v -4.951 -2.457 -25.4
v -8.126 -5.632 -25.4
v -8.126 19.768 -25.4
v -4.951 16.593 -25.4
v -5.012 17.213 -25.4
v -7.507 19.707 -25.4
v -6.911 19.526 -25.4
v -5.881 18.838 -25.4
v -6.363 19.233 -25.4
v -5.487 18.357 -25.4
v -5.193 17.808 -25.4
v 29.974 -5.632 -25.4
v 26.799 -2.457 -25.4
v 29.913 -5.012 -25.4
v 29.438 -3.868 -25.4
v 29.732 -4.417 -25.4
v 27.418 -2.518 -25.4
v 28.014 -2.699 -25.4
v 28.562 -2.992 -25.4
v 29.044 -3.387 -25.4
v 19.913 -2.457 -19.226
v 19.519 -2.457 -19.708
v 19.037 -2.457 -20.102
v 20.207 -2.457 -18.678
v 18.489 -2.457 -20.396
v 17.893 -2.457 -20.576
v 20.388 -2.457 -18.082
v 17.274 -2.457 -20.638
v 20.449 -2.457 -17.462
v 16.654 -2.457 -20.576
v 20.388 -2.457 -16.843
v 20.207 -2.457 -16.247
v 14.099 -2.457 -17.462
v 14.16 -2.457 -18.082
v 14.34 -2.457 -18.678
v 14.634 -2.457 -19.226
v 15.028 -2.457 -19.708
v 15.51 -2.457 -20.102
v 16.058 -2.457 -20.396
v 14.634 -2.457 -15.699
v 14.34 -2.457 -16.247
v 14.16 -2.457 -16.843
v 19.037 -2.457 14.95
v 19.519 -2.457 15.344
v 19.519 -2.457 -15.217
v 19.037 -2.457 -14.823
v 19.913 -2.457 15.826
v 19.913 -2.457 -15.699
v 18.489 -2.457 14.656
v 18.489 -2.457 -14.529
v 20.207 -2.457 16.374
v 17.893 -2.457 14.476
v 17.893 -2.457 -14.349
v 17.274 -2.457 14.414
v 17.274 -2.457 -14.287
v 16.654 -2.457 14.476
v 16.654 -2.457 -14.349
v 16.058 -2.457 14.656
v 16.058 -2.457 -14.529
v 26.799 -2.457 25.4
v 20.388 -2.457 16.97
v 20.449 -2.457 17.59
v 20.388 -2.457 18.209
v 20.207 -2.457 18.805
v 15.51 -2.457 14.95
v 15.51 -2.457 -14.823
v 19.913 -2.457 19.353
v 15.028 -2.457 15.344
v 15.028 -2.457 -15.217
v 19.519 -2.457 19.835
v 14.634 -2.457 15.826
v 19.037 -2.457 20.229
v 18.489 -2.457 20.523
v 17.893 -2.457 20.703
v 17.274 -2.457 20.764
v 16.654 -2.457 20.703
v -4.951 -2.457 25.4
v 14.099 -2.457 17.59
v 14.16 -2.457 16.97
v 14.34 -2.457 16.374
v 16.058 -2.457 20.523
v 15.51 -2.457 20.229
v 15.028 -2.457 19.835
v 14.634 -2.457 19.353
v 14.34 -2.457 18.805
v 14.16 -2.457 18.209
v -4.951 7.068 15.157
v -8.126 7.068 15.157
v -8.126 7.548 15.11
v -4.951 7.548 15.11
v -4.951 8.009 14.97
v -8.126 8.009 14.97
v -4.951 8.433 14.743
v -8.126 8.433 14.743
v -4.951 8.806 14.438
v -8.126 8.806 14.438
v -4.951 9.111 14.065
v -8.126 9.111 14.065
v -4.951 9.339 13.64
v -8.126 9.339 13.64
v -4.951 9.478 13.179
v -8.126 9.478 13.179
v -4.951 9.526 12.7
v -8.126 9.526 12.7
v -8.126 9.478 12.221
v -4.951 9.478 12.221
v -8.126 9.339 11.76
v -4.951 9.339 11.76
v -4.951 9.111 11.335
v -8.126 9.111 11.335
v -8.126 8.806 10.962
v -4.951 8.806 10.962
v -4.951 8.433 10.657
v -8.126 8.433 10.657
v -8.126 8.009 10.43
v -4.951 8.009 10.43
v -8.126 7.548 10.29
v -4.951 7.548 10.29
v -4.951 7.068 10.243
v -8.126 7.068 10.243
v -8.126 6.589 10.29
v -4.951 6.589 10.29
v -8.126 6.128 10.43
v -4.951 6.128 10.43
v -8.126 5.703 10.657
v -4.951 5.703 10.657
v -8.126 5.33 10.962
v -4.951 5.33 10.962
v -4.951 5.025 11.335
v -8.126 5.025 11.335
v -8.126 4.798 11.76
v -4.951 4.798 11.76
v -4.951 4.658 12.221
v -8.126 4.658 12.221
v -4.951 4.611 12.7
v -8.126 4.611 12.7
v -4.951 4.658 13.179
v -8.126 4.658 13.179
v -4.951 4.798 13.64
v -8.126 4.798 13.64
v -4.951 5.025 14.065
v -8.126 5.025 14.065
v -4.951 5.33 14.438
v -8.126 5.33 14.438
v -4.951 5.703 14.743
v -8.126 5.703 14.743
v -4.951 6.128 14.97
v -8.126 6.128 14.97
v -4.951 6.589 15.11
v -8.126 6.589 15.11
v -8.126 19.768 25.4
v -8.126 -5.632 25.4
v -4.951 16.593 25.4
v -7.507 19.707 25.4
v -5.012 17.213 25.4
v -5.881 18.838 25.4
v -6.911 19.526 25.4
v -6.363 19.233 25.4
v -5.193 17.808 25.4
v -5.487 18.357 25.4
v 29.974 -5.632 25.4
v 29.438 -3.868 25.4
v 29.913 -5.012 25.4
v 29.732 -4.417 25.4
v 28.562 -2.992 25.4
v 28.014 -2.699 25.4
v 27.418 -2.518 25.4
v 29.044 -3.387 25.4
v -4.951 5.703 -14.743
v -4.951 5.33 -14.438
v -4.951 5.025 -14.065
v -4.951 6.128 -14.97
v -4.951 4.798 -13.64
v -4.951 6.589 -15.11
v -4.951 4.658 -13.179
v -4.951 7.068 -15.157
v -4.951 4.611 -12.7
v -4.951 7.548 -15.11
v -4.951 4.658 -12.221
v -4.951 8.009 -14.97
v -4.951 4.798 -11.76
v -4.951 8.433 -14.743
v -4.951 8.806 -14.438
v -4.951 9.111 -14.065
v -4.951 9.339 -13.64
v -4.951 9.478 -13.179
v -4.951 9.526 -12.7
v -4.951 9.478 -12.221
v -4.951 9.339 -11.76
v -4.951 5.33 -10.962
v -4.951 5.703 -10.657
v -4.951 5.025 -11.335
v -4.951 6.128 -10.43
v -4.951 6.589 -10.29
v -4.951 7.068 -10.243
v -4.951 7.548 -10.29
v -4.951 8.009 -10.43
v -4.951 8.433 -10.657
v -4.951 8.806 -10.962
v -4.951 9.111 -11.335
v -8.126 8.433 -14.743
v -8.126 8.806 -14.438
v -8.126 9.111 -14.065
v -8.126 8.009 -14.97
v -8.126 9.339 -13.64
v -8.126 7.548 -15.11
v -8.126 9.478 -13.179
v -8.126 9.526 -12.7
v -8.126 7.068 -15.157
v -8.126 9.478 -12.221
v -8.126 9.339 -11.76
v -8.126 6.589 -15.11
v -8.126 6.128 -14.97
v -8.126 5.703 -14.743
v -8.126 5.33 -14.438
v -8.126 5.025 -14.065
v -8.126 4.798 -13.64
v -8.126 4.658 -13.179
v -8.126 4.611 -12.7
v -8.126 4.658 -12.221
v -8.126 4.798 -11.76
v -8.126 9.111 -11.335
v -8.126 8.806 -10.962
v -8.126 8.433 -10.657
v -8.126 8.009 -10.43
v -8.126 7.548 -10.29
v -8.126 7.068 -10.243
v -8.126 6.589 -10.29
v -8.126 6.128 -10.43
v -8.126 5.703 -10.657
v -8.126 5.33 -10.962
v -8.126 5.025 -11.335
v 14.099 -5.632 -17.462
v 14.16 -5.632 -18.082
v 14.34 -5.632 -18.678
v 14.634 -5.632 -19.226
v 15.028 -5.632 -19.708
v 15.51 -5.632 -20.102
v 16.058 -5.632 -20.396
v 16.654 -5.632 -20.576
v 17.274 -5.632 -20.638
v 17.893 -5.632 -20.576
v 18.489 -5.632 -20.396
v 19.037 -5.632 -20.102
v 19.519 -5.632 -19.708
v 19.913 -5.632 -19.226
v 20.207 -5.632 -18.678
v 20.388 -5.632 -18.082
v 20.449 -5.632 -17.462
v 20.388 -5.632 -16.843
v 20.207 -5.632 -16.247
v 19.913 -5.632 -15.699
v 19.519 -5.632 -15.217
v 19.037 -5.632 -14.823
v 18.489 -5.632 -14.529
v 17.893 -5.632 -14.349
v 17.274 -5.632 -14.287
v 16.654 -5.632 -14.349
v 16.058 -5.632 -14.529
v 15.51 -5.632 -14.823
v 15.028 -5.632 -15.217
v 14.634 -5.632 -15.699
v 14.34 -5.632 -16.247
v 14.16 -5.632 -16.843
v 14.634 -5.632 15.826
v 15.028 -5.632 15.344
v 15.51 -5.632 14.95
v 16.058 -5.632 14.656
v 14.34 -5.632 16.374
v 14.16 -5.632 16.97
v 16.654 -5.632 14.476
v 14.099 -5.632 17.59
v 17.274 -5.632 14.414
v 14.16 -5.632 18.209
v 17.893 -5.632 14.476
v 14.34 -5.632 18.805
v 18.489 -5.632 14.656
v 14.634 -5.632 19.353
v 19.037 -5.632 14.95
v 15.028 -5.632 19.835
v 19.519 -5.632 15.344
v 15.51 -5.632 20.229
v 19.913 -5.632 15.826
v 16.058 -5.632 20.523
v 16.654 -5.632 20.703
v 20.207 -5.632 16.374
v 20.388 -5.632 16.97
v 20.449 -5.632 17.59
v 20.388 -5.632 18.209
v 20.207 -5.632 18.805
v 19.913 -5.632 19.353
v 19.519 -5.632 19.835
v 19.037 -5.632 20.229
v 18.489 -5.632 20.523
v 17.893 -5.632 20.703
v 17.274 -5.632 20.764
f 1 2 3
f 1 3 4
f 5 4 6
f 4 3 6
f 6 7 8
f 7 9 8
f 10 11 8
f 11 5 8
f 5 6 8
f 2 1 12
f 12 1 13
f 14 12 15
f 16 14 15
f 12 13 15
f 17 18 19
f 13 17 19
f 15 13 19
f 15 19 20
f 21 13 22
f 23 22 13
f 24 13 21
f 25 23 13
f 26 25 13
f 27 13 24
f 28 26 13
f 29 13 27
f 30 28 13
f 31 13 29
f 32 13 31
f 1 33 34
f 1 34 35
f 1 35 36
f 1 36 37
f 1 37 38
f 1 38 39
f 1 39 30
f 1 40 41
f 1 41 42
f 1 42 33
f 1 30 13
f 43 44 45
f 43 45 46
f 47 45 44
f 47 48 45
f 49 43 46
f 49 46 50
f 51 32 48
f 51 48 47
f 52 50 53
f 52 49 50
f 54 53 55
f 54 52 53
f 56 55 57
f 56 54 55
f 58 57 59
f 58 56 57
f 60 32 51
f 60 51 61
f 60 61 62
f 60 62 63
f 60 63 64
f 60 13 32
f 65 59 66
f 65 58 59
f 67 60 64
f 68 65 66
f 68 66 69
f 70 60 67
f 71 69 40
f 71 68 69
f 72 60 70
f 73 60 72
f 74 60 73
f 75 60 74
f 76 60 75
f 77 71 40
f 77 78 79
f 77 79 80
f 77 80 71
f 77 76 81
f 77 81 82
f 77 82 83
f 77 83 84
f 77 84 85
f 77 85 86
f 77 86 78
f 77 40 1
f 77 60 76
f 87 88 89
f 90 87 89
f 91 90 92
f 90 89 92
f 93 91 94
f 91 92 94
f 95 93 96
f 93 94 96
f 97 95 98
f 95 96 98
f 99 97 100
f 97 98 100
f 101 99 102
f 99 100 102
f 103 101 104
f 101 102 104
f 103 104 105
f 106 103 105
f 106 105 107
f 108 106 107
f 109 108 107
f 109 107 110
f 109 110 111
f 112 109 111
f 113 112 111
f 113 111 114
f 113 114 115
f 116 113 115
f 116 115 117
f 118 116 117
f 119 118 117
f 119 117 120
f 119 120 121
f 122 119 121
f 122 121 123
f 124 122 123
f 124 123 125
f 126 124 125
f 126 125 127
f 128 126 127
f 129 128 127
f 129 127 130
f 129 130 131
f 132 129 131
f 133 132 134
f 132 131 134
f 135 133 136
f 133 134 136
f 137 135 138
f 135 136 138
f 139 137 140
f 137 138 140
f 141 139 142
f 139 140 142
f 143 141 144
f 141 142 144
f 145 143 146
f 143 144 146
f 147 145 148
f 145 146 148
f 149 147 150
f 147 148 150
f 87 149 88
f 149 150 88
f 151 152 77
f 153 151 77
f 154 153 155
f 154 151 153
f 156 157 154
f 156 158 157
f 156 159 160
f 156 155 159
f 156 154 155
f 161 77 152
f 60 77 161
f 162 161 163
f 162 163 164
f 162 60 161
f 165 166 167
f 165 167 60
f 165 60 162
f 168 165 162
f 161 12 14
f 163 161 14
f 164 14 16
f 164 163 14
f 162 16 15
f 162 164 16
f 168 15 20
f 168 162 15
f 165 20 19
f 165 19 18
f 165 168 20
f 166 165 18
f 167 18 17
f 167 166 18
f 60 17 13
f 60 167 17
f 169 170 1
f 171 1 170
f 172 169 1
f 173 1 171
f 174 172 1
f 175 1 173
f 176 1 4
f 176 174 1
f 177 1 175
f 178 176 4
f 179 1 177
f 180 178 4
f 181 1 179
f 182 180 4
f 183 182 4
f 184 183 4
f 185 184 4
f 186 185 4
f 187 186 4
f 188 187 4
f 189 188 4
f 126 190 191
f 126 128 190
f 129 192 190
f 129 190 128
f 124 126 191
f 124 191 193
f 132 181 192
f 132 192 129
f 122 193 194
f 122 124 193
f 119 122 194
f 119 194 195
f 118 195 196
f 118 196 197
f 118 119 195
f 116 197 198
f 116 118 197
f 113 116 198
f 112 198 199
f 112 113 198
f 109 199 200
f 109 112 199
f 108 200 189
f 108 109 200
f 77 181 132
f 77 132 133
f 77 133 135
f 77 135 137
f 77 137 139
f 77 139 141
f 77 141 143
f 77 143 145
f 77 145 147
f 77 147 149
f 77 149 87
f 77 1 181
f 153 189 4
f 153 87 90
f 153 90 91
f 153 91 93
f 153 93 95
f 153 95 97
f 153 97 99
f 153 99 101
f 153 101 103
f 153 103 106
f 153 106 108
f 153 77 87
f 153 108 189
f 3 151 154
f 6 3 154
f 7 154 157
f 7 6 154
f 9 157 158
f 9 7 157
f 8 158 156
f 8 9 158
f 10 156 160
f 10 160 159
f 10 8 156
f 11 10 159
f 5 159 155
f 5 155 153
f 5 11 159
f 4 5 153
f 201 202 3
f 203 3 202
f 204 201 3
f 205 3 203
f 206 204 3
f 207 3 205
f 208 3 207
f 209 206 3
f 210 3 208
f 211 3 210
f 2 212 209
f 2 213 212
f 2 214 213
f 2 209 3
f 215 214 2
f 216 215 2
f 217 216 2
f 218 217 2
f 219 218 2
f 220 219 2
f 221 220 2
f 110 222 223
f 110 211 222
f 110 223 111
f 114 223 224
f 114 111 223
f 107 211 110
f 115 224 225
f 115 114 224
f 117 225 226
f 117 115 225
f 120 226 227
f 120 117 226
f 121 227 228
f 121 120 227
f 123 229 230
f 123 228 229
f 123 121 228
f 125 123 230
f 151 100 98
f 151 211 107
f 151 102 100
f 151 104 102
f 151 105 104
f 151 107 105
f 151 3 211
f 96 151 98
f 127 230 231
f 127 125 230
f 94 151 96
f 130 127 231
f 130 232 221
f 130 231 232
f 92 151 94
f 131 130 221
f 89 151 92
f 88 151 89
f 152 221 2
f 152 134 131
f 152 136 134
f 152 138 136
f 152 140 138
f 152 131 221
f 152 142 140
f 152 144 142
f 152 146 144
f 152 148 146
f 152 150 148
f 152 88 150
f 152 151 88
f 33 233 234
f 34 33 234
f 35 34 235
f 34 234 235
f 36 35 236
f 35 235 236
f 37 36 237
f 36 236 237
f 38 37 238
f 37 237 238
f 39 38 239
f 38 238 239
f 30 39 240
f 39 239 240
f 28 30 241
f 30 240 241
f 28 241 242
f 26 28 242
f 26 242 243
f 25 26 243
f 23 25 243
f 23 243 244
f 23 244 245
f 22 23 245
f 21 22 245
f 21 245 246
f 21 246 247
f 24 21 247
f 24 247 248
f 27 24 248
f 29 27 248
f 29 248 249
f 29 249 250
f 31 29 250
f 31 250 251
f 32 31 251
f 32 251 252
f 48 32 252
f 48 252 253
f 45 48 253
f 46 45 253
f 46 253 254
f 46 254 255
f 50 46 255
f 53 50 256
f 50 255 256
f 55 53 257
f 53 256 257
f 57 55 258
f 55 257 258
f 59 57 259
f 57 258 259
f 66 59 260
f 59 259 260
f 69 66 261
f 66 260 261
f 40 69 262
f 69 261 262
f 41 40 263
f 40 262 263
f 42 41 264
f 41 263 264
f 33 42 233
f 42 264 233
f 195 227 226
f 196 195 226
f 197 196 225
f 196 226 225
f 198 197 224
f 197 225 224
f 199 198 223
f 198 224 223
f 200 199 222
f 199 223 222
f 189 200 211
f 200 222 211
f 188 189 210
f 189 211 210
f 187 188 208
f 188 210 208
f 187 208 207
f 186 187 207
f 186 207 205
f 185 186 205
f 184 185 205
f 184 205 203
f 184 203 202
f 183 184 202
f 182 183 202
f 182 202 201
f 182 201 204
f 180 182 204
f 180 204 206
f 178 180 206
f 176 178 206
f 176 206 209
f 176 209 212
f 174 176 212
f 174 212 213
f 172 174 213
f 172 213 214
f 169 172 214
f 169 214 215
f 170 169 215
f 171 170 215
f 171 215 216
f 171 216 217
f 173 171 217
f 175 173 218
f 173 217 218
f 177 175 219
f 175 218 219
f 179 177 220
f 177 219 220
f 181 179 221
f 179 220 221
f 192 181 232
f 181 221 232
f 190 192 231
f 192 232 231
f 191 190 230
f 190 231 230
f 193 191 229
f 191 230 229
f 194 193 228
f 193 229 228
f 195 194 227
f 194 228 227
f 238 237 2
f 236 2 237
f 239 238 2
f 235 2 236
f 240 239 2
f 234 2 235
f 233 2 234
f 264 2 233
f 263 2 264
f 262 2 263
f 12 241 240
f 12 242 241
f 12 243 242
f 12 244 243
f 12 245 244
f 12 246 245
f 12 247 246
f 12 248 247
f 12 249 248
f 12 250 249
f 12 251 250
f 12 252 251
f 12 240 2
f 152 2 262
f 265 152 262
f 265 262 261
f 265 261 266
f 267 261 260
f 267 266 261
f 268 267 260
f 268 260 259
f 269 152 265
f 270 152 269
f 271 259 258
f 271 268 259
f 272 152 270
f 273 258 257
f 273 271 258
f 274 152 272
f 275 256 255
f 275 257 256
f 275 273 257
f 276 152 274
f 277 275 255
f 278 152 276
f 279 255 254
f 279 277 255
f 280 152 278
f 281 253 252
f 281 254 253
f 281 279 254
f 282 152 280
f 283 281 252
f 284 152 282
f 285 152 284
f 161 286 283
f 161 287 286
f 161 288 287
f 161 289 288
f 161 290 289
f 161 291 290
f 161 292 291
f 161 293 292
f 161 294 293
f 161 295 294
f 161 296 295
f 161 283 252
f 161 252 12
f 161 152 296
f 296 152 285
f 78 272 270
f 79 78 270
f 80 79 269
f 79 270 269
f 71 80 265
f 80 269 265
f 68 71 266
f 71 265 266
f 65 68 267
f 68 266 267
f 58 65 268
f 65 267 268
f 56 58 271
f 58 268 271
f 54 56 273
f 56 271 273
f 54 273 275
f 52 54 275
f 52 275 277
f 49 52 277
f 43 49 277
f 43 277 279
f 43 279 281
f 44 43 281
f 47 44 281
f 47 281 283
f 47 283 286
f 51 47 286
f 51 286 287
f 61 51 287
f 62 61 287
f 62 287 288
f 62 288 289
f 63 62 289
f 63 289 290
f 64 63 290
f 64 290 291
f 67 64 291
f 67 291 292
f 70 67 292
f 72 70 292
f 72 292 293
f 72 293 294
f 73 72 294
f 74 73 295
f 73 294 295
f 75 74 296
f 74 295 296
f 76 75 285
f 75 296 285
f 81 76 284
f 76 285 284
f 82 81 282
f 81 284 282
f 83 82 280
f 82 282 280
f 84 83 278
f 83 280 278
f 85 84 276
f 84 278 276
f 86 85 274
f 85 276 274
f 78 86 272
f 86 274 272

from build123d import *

# Parameters (mm, degrees)
BOSS_EXTRUDE1_DEPTH              = 25.4
F_1_4_0_25_DIAMETER_HOLE1_D      = 6.35
F_1_4_0_25_DIAMETER_HOLE1_DEPTH  = 17.526
F_1_4_0_25_DIAMETER_HOLE1_TIP    = 1.907732465
F_10_0_1935_DIAMETER_HOLE1_D     = 4.9149
F_10_0_1935_DIAMETER_HOLE1_DEPTH = 17.526
F_10_0_1935_DIAMETER_HOLE1_TIP   = 1.476584928
FILLET1_R                        = 3.175


with BuildPart() as part:
    # Sketch1 → Boss-Extrude1 (new, symmetric)
    with BuildSketch(Plane.XY):
        Polygon((-8.126488095, 19.768154762), (-8.126488095, -5.631845238), (29.973511905, -5.631845238), (29.973511905, -2.456845238), (-4.951488095, -2.456845238), (-4.951488095, 19.768154762), align=None)
    extrude(amount=BOSS_EXTRUDE1_DEPTH, both=True)

    # 1/4 (0.25) Diameter Hole1
    with Locations(Plane(origin=(0, -2.456845238, 0), x_dir=(1, 0, 0), z_dir=(0, 1, 0))):
        with Locations((17.273511905, 17.4625), (17.273511905, -17.5895)):
            Hole(F_1_4_0_25_DIAMETER_HOLE1_D / 2, depth=F_1_4_0_25_DIAMETER_HOLE1_DEPTH)
            with Locations((0, 0, -(F_1_4_0_25_DIAMETER_HOLE1_DEPTH + F_1_4_0_25_DIAMETER_HOLE1_TIP / 2))):  # 118° drill point
                Cone(0, F_1_4_0_25_DIAMETER_HOLE1_D / 2, F_1_4_0_25_DIAMETER_HOLE1_TIP, mode=Mode.SUBTRACT)

    # #10 (0.1935) Diameter Hole1
    with Locations(Plane(origin=(-4.951488095, 0, 0), x_dir=(0, 0, -1), z_dir=(1, 0, 0))):
        with Locations((12.7, 7.068154762), (-12.7, 7.068154762)):
            Hole(F_10_0_1935_DIAMETER_HOLE1_D / 2, depth=F_10_0_1935_DIAMETER_HOLE1_DEPTH)
            with Locations((0, 0, -(F_10_0_1935_DIAMETER_HOLE1_DEPTH + F_10_0_1935_DIAMETER_HOLE1_TIP / 2))):  # 118° drill point
                Cone(0, F_10_0_1935_DIAMETER_HOLE1_D / 2, F_10_0_1935_DIAMETER_HOLE1_TIP, mode=Mode.SUBTRACT)

    # Fillet1
    fillet1_edges = [part.edges().sort_by_distance(p)[0] for p in [
        (29.973511905, -2.456845238, 0),
        (-4.951488095, 19.768154762, 0),
    ]]
    fillet(fillet1_edges, radius=FILLET1_R - 0.0001)  # a hair under: the kernel refuses the full size


solid = part.part
